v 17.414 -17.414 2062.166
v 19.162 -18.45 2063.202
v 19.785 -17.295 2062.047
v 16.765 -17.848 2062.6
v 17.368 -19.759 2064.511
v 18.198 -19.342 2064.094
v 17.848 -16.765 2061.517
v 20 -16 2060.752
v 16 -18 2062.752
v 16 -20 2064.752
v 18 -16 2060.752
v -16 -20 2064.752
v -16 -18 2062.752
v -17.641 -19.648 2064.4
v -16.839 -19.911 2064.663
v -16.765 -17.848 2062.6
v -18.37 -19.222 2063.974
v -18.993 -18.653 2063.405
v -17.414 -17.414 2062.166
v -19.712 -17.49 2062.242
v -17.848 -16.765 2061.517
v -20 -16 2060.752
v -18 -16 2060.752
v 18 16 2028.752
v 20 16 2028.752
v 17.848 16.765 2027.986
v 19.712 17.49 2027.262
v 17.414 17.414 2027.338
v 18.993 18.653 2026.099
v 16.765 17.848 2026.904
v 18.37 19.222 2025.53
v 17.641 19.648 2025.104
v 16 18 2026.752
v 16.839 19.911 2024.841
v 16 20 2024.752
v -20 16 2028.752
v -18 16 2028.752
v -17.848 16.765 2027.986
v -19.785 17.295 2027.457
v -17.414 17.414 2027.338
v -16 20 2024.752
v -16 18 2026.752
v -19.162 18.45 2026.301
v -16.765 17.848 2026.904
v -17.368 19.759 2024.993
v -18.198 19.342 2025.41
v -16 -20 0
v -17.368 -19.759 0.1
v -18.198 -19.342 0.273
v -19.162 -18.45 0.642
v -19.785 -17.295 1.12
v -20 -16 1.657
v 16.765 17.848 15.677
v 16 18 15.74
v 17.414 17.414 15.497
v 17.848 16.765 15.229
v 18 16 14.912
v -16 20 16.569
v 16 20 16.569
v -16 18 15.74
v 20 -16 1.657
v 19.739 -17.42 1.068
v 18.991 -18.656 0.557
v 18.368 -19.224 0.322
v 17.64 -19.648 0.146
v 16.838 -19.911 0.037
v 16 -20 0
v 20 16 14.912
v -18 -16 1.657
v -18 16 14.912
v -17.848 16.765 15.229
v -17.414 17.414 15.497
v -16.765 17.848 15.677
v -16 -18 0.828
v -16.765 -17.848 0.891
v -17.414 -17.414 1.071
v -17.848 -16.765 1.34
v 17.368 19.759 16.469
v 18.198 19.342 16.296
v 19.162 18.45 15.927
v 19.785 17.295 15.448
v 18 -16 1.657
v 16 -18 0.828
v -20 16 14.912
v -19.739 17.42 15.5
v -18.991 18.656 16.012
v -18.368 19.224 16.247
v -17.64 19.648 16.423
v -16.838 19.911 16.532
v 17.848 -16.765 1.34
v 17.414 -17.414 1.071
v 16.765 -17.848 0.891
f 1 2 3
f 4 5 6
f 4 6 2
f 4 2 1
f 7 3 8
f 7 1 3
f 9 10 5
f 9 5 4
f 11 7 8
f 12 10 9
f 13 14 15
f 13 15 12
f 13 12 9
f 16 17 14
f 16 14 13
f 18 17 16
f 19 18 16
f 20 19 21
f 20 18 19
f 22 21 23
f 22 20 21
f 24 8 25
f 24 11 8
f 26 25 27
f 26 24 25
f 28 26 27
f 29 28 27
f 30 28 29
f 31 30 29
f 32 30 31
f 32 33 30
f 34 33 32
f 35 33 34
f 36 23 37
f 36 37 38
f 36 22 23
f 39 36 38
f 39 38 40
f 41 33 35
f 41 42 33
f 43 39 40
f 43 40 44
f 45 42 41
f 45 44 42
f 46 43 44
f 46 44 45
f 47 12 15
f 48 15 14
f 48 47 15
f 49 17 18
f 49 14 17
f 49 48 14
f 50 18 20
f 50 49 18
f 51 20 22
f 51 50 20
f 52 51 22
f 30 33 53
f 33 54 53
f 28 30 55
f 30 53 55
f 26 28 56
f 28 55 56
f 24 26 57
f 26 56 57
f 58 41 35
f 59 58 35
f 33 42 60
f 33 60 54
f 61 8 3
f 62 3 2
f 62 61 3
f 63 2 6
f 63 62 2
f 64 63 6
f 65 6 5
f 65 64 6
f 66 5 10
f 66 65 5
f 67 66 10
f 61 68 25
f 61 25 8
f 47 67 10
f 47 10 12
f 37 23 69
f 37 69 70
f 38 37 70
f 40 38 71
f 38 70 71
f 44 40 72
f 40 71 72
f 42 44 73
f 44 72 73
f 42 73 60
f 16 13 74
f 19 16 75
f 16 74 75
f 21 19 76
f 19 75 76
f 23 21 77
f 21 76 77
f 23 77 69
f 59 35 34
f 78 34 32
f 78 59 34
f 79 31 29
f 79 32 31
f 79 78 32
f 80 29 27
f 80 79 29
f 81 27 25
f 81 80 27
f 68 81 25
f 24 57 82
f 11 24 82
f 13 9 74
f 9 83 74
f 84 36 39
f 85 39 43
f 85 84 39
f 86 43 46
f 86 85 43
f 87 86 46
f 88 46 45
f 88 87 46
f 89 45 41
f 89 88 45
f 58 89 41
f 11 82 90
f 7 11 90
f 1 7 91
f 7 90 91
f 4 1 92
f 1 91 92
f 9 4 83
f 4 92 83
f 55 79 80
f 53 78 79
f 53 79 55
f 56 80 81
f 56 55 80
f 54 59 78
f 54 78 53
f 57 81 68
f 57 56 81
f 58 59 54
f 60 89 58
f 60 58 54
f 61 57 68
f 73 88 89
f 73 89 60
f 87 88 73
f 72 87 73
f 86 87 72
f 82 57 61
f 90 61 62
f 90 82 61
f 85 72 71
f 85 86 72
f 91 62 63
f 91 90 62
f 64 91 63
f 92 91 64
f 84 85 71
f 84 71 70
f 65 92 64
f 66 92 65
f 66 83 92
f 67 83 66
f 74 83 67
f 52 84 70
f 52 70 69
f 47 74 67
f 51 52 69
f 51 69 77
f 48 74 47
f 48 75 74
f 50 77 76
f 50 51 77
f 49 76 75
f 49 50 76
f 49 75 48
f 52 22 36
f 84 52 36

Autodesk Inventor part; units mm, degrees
ref_plane "Start Plane" through (0, 0, 0) normal (0, 0, 1) x (1, 0, 0)
ref_plane "End Plane" through (0, 0, 2064.7518) normal (0, 0, 1) x (1, 0, 0)
sketch "Sketch" plane through (0, 0, 0) normal (0, 0, 1) x (1, 0, 0)
  line L0 (-20, -16) -> (-20, 16)
  line L1 (-16, 20) -> (16, 20)
  line L2 (20, 16) -> (20, -16)
  line L3 (16, -20) -> (-16, -20)
  arc A0 (-20, -16) -> (-16, -20) centre (-16, -16) ccw
  arc A1 (20, 16) -> (16, 20) centre (16, 16) ccw
  arc A2 (-16, 20) -> (-20, 16) centre (-16, 16) ccw
  arc A3 (16, -20) -> (20, -16) centre (16, -16) ccw
  arc A4 (-16, 18) -> (-18, 16) centre (-16, 16) ccw
  line L4 (-16, 18) -> (16, 18)
  arc A5 (18, 16) -> (16, 18) centre (16, 16) ccw
  line L5 (18, 16) -> (18, -16)
  arc A6 (16, -18) -> (18, -16) centre (16, -16) ccw
  line L6 (16, -18) -> (-16, -18)
  arc A7 (-18, -16) -> (-16, -18) centre (-16, -16) ccw
  line L7 (-18, -16) -> (-18, 16)
  line L8 (0, 29.1598) -> (0, -29.1598) construction
  line L9 (-29.1598, 0) -> (29.1598, 0) construction
  dimension "d7" = 4
  dimension "d9" = 40
  dimension "d11" = 40
  dimension "d12" = 2
  dimension "d15" = 20
  dimension "d16" = 20
extrude "Body" add sketch "Sketch" along normal up to surface (2064.7518 mm away) from surface at 0
sketch "Sketch3" plane through (0, 0, 0) normal (0, 0, 1) x (1, 0, 0)
  line L0 (0, 0) -> (10, 0)
ref_plane "Work Plane3" through (0, 0, 0) normal (0, -1, 0) x (1, 0, 0)
ref_plane "Work Plane4" through (0, -20, 0) normal (0, 0.3827, -0.9239) x (1, 0, 0)
split "Split1" plane through (0, -20, 0) removes the side toward (0, 0.3827, -0.9239)
ref_plane "Work Plane5" through (16, 1323.5029, 721.2489) normal (0, 0.7071, 0.7071) x (1, 0, 0)
split "Split2" plane through (16, 1323.5029, 721.2489) removes the side toward (0, 0.7071, 0.7071)
sketch "Sketch4" plane through (0, 0, 0) normal (0, -1, 0) x (1, 0, 0)
  line L0 (-2, 0) -> (12, 0) projected
  line L1 (-2, 2064.7518) -> (12, 2064.7518) projected
  dimension "d18" = 2064.7518
equation "\"d7\" = G_IR"
equation "\"d9\" = G_W"
equation "\"d11\" = G_H"
equation "\"d12\" = G_T"
equation "\"d15\" = 0.5 * d9"
equation "\"d16\" = 0.5 * d11"
equation "\"d3\" = G_L"
equation "\"G_W\" = 40"
equation "\"G_H\" = 40"
equation "\"G_T\" = 2"
equation "\"G_IR\" = 4"
equation "\"G_L\" = d18"
equation "\"G_OFFSET_START\" = 0"
equation "\"G_OFFSET_END\" = -56.56854"
equation "\"d14\" = G_OFFSET_END + B_L"
equation "\"B_L\" = 2121.32034"
properties part number "ISO 10799-2 - 40x40x2 - 2064,75" material "Stainless Steel"
